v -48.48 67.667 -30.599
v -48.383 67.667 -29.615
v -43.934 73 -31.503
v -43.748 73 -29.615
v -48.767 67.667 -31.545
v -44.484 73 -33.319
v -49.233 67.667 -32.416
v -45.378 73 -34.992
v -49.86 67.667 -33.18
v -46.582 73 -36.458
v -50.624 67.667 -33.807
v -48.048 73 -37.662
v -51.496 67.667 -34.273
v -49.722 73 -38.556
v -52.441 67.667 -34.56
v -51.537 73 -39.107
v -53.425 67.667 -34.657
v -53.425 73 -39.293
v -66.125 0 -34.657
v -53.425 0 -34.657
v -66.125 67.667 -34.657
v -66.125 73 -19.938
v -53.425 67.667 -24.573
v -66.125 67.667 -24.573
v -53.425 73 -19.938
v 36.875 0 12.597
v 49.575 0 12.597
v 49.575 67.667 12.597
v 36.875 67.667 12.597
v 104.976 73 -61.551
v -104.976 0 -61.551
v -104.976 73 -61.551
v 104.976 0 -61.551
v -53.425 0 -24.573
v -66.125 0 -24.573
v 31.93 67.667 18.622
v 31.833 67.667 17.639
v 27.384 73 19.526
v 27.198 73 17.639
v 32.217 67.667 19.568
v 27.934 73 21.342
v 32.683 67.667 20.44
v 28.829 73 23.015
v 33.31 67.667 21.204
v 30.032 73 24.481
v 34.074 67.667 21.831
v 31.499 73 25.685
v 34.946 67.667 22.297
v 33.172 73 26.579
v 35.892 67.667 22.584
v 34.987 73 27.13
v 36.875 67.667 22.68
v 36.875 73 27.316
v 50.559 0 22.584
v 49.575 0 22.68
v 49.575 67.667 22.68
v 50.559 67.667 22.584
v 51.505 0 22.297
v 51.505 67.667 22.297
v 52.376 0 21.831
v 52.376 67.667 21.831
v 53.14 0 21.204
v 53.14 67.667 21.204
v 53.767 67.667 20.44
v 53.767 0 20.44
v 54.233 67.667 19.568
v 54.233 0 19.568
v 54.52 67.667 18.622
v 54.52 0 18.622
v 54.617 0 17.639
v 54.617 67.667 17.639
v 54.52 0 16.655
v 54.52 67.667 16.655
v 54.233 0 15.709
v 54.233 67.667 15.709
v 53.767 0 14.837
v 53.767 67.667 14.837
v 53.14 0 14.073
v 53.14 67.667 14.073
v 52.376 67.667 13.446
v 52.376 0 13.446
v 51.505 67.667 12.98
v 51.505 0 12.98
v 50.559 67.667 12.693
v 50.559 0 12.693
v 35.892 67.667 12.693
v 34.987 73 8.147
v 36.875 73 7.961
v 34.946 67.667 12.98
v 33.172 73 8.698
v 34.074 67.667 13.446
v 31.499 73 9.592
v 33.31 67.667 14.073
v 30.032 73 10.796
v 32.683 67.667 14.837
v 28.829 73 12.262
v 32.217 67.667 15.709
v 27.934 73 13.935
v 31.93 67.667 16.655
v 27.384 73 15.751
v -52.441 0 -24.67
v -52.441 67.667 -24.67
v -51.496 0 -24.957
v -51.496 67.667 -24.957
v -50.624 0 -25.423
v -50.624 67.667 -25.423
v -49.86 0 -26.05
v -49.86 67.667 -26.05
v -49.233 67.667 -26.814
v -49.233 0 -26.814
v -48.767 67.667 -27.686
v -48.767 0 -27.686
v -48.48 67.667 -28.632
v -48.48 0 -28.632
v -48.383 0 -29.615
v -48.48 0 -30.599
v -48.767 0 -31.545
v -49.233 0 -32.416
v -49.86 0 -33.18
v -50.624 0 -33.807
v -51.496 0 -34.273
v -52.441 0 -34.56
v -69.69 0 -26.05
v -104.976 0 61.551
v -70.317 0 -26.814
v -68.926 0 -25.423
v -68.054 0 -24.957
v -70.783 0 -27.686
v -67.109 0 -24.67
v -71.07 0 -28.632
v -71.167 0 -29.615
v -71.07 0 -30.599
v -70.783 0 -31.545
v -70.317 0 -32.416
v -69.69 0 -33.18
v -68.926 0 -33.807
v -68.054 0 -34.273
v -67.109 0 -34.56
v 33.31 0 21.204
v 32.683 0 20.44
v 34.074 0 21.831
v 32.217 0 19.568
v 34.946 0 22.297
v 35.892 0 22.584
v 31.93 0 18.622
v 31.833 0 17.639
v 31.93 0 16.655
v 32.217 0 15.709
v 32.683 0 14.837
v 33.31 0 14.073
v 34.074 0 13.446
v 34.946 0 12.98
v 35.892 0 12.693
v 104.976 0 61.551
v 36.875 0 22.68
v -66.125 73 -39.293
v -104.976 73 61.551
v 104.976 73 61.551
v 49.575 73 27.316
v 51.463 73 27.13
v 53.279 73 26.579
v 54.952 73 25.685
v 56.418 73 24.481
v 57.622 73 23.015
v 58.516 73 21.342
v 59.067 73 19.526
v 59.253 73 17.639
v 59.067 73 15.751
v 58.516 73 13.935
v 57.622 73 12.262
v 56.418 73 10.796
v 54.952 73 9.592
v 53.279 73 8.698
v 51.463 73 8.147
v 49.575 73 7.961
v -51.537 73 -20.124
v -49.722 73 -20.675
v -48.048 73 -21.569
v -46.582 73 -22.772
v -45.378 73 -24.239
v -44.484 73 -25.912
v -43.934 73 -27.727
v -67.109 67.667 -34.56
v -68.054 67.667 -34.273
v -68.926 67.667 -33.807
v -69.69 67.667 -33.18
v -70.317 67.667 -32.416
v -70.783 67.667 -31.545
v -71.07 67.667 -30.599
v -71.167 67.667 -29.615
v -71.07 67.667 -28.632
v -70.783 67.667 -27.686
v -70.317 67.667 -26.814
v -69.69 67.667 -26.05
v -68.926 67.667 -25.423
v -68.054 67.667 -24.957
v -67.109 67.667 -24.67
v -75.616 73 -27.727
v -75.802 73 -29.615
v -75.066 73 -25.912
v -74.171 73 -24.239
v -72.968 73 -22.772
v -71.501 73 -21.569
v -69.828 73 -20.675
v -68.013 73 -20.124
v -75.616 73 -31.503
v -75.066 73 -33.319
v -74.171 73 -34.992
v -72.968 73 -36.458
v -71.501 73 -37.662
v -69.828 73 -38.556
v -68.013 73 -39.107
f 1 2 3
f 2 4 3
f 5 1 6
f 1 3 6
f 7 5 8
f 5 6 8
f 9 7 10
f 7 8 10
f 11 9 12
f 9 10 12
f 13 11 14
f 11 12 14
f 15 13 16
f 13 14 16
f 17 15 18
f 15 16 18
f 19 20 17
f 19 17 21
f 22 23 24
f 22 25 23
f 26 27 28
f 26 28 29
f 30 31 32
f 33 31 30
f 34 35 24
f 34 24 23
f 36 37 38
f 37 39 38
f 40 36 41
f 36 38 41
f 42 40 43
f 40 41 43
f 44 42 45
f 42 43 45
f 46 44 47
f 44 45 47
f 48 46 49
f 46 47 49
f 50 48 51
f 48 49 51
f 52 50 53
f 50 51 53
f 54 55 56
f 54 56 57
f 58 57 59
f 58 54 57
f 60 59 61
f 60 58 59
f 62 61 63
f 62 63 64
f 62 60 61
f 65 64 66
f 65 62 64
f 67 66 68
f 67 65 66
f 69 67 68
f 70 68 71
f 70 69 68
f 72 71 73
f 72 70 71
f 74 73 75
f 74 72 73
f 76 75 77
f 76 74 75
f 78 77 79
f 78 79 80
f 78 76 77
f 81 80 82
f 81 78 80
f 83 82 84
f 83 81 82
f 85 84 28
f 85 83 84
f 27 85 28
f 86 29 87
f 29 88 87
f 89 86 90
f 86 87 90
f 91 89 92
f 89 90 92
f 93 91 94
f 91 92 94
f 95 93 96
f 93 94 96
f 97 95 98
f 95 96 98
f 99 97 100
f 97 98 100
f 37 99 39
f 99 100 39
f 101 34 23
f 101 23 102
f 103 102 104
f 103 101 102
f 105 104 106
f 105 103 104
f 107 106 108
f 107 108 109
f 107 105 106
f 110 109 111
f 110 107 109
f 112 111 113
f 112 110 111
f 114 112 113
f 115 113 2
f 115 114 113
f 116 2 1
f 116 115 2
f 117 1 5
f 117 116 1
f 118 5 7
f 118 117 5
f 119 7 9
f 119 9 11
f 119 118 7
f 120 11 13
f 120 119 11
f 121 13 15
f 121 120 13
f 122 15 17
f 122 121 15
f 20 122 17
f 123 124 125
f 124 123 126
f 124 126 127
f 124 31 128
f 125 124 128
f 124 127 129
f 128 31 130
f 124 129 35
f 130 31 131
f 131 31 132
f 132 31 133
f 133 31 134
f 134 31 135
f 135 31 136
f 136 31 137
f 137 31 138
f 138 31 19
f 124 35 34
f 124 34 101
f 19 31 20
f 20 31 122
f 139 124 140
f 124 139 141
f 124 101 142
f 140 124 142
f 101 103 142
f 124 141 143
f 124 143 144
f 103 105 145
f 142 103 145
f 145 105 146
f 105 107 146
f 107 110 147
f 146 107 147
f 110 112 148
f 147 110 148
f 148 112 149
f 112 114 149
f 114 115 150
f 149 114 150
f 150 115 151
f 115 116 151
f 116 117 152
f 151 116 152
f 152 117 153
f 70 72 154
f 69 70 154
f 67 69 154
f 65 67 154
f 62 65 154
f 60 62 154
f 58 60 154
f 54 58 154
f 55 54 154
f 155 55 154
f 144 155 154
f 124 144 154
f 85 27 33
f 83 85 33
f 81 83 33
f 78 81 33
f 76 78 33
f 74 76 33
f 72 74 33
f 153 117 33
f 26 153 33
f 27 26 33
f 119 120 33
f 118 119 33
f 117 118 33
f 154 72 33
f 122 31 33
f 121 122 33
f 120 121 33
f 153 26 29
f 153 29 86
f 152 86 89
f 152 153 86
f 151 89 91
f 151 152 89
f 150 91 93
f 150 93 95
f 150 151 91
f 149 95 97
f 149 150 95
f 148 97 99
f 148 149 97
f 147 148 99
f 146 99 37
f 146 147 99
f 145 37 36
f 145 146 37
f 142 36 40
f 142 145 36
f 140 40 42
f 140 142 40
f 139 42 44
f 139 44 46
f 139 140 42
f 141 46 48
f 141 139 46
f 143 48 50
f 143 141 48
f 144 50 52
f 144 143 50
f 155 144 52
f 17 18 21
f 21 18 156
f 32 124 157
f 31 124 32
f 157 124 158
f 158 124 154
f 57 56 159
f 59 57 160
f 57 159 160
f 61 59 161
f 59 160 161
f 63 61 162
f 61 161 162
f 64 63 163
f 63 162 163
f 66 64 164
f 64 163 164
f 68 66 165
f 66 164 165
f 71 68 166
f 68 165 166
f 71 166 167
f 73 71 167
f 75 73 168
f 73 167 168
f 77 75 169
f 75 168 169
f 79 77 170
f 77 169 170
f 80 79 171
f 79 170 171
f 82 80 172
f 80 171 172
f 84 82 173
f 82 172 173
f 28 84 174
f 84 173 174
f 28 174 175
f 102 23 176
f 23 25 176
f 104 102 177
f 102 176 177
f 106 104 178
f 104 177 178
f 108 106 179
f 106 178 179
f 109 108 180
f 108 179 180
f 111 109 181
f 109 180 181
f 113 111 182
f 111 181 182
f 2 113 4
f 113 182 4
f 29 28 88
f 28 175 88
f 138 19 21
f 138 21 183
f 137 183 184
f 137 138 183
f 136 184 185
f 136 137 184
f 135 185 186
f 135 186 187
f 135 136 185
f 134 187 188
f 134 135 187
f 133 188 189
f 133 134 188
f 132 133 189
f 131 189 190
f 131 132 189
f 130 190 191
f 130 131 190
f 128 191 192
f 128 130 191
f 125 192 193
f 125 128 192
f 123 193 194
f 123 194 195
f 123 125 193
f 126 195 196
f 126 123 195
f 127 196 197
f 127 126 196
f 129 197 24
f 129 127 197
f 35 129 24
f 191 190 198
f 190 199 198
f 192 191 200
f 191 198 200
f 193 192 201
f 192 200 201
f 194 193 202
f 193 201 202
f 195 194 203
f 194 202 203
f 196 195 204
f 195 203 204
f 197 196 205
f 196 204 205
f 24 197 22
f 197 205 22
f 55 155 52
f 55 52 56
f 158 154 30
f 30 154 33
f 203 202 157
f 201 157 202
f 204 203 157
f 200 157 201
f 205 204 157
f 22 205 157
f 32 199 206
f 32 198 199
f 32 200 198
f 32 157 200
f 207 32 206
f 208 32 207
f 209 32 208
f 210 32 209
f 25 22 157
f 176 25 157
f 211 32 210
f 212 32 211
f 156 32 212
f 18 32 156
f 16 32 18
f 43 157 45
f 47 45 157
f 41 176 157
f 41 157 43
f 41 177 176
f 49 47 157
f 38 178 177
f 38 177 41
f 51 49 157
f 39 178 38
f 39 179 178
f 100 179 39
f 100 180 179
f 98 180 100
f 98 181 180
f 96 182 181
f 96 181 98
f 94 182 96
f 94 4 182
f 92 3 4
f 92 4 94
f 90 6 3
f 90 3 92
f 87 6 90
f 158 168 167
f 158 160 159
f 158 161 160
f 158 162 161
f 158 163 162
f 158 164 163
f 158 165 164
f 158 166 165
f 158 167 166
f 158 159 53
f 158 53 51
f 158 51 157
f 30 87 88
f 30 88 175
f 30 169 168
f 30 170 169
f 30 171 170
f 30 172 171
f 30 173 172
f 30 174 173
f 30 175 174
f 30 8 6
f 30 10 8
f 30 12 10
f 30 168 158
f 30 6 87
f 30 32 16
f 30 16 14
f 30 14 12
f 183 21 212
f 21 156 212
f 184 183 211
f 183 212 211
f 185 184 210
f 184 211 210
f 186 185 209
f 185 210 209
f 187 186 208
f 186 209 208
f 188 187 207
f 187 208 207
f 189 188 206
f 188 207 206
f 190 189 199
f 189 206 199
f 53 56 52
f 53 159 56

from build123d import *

# Parameters (mm, degrees)
SKETCH1_W                                      = 209.952415438
SKETCH1_H                                      = 123.10253427
BOSS_EXTRUDE1_DEPTH                            = 73
CSK_START                                      = -1
CSK_SLOT_FOR_3_8_FLAT_HEAD_MACHINE_SCREW_DEPTH = 74


with BuildPart() as part:
    # Sketch1 → Boss-Extrude1 (new body)
    with BuildSketch(Plane(origin=(0, 0, 0), x_dir=(1, 0, 0), z_dir=(0, 1, 0))):
        Rectangle(SKETCH1_W, SKETCH1_H)
    extrude(amount=BOSS_EXTRUDE1_DEPTH)

    # CSK SLOT for 3/8 Flat Head Machine Screw1: read off the stored shape, not the designer's step
    # CSK SLOT for 3_8 Flat Head Machine S 2 → CSK SLOT for 3/8 Flat Head Machine Screw1 (cut)
    with BuildSketch(Plane(origin=(0, 0, 0), x_dir=(1, 0, 0), z_dir=(0, 1, 0)).offset(CSK_START)):
        with BuildLine():
            Line((36.875245681, -22.680413351), (49.575245681, -22.680413351))
            ThreePointArc((49.575245681, -22.680413351), (54.617145681, -17.638513351), (49.575245681, -12.596613351))
            Line((49.575245681, -12.596613351), (36.875245681, -12.596613351))
            ThreePointArc((36.875245681, -12.596613351), (31.833345681, -17.638513351), (36.875245681, -22.680413351))
        make_face()
        with BuildLine():
            Line((-66.124961912, 24.573381676), (-53.424961912, 24.573381676))
            ThreePointArc((-53.424961912, 24.573381676), (-48.383061912, 29.615281676), (-53.424961912, 34.657181676))
            Line((-53.424961912, 34.657181676), (-66.124961912, 34.657181676))
            ThreePointArc((-66.124961912, 34.657181676), (-71.166861912, 29.615281676), (-66.124961912, 24.573381676))
        make_face()
    extrude(amount=CSK_SLOT_FOR_3_8_FLAT_HEAD_MACHINE_SCREW_DEPTH, mode=Mode.SUBTRACT)

    # CSK SLOT for 3_8 Flat Head Machine S 3: loft between two sections, ruled curve by curve
    csk_slot_for_3_8_flat_head_machine_s_3_from = [
        Edge.make_three_point_arc((49.575245681, 67.667467248, 22.680413351), (53.140407361, 67.667467248, 21.203675031), (54.617145681, 67.667467248, 17.638513351)),
        Edge.make_three_point_arc((54.617145681, 67.667467248, 17.638513351), (53.140407361, 67.667467248, 14.073351671), (49.575245681, 67.667467248, 12.596613351)),
        Edge.make_three_point_arc((36.875245681, 67.667467248, 12.596613351), (33.310084001, 67.667467248, 14.073351671), (31.833345681, 67.667467248, 17.638513351)),
        Edge.make_three_point_arc((31.833345681, 67.667467248, 17.638513351), (33.310084001, 67.667467248, 21.203675031), (36.875245681, 67.667467248, 22.680413351)),
        Edge.make_line((49.575245681, 67.667467248, 12.596613351), (36.875245681, 67.667467248, 12.596613351)),
        Edge.make_line((49.575245681, 67.667467248, 22.680413351), (36.875245681, 67.667467248, 22.680413351)),
    ]
    csk_slot_for_3_8_flat_head_machine_s_3_to = [
        Edge.make_three_point_arc((49.575245681, 73, 27.315913351), (56.418200846, 73, 24.481468515), (59.252645681, 73, 17.638513351)),
        Edge.make_three_point_arc((59.252645681, 73, 17.638513351), (56.418200846, 73, 10.795558187), (49.575245681, 73, 7.961113351)),
        Edge.make_three_point_arc((36.875245681, 73, 7.961113351), (30.032290517, 73, 10.795558187), (27.197845681, 73, 17.638513351)),
        Edge.make_three_point_arc((27.197845681, 73, 17.638513351), (30.032290517, 73, 24.481468515), (36.875245681, 73, 27.315913351)),
        Edge.make_line((49.575245681, 73, 7.961113351), (36.875245681, 73, 7.961113351)),
        Edge.make_line((49.575245681, 73, 27.315913351), (36.875245681, 73, 27.315913351)),
    ]
    csk_slot_for_3_8_flat_head_machine_s_3 = Solid(Shell([*[Face.make_surface_from_curves(csk_slot_for_3_8_flat_head_machine_s_3_from[k], csk_slot_for_3_8_flat_head_machine_s_3_to[k]) for k in range(6)], Face(Wire(csk_slot_for_3_8_flat_head_machine_s_3_from)), Face(Wire(csk_slot_for_3_8_flat_head_machine_s_3_to))]))
    add(csk_slot_for_3_8_flat_head_machine_s_3, mode=Mode.SUBTRACT)

    # CSK SLOT for 3_8 Flat Head Machine S 4: loft between two sections, ruled curve by curve
    csk_slot_for_3_8_flat_head_machine_s_4_from = [
        Edge.make_three_point_arc((-53.424961912, 67.667467248, -24.573381676), (-49.859800232, 67.667467248, -26.050119996), (-48.383061912, 67.667467248, -29.615281676)),
        Edge.make_three_point_arc((-48.383061912, 67.667467248, -29.615281676), (-49.859800232, 67.667467248, -33.180443356), (-53.424961912, 67.667467248, -34.657181676)),
        Edge.make_three_point_arc((-66.124961912, 67.667467248, -34.657181676), (-69.690123592, 67.667467248, -33.180443356), (-71.166861912, 67.667467248, -29.615281676)),
        Edge.make_three_point_arc((-71.166861912, 67.667467248, -29.615281676), (-69.690123592, 67.667467248, -26.050119996), (-66.124961912, 67.667467248, -24.573381676)),
        Edge.make_line((-53.424961912, 67.667467248, -34.657181676), (-66.124961912, 67.667467248, -34.657181676)),
        Edge.make_line((-53.424961912, 67.667467248, -24.573381676), (-66.124961912, 67.667467248, -24.573381676)),
    ]
    csk_slot_for_3_8_flat_head_machine_s_4_to = [
        Edge.make_three_point_arc((-53.424961912, 73, -19.937881676), (-46.582006748, 73, -22.772326512), (-43.747561912, 73, -29.615281676)),
        Edge.make_three_point_arc((-43.747561912, 73, -29.615281676), (-46.582006748, 73, -36.45823684), (-53.424961912, 73, -39.292681676)),
        Edge.make_three_point_arc((-66.124961912, 73, -39.292681676), (-72.967917076, 73, -36.45823684), (-75.802361912, 73, -29.615281676)),
        Edge.make_three_point_arc((-75.802361912, 73, -29.615281676), (-72.967917076, 73, -22.772326512), (-66.124961912, 73, -19.937881676)),
        Edge.make_line((-53.424961912, 73, -39.292681676), (-66.124961912, 73, -39.292681676)),
        Edge.make_line((-53.424961912, 73, -19.937881676), (-66.124961912, 73, -19.937881676)),
    ]
    csk_slot_for_3_8_flat_head_machine_s_4 = Solid(Shell([*[Face.make_surface_from_curves(csk_slot_for_3_8_flat_head_machine_s_4_from[k], csk_slot_for_3_8_flat_head_machine_s_4_to[k]) for k in range(6)], Face(Wire(csk_slot_for_3_8_flat_head_machine_s_4_from)), Face(Wire(csk_slot_for_3_8_flat_head_machine_s_4_to))]))
    add(csk_slot_for_3_8_flat_head_machine_s_4, mode=Mode.SUBTRACT)


solid = part.part
